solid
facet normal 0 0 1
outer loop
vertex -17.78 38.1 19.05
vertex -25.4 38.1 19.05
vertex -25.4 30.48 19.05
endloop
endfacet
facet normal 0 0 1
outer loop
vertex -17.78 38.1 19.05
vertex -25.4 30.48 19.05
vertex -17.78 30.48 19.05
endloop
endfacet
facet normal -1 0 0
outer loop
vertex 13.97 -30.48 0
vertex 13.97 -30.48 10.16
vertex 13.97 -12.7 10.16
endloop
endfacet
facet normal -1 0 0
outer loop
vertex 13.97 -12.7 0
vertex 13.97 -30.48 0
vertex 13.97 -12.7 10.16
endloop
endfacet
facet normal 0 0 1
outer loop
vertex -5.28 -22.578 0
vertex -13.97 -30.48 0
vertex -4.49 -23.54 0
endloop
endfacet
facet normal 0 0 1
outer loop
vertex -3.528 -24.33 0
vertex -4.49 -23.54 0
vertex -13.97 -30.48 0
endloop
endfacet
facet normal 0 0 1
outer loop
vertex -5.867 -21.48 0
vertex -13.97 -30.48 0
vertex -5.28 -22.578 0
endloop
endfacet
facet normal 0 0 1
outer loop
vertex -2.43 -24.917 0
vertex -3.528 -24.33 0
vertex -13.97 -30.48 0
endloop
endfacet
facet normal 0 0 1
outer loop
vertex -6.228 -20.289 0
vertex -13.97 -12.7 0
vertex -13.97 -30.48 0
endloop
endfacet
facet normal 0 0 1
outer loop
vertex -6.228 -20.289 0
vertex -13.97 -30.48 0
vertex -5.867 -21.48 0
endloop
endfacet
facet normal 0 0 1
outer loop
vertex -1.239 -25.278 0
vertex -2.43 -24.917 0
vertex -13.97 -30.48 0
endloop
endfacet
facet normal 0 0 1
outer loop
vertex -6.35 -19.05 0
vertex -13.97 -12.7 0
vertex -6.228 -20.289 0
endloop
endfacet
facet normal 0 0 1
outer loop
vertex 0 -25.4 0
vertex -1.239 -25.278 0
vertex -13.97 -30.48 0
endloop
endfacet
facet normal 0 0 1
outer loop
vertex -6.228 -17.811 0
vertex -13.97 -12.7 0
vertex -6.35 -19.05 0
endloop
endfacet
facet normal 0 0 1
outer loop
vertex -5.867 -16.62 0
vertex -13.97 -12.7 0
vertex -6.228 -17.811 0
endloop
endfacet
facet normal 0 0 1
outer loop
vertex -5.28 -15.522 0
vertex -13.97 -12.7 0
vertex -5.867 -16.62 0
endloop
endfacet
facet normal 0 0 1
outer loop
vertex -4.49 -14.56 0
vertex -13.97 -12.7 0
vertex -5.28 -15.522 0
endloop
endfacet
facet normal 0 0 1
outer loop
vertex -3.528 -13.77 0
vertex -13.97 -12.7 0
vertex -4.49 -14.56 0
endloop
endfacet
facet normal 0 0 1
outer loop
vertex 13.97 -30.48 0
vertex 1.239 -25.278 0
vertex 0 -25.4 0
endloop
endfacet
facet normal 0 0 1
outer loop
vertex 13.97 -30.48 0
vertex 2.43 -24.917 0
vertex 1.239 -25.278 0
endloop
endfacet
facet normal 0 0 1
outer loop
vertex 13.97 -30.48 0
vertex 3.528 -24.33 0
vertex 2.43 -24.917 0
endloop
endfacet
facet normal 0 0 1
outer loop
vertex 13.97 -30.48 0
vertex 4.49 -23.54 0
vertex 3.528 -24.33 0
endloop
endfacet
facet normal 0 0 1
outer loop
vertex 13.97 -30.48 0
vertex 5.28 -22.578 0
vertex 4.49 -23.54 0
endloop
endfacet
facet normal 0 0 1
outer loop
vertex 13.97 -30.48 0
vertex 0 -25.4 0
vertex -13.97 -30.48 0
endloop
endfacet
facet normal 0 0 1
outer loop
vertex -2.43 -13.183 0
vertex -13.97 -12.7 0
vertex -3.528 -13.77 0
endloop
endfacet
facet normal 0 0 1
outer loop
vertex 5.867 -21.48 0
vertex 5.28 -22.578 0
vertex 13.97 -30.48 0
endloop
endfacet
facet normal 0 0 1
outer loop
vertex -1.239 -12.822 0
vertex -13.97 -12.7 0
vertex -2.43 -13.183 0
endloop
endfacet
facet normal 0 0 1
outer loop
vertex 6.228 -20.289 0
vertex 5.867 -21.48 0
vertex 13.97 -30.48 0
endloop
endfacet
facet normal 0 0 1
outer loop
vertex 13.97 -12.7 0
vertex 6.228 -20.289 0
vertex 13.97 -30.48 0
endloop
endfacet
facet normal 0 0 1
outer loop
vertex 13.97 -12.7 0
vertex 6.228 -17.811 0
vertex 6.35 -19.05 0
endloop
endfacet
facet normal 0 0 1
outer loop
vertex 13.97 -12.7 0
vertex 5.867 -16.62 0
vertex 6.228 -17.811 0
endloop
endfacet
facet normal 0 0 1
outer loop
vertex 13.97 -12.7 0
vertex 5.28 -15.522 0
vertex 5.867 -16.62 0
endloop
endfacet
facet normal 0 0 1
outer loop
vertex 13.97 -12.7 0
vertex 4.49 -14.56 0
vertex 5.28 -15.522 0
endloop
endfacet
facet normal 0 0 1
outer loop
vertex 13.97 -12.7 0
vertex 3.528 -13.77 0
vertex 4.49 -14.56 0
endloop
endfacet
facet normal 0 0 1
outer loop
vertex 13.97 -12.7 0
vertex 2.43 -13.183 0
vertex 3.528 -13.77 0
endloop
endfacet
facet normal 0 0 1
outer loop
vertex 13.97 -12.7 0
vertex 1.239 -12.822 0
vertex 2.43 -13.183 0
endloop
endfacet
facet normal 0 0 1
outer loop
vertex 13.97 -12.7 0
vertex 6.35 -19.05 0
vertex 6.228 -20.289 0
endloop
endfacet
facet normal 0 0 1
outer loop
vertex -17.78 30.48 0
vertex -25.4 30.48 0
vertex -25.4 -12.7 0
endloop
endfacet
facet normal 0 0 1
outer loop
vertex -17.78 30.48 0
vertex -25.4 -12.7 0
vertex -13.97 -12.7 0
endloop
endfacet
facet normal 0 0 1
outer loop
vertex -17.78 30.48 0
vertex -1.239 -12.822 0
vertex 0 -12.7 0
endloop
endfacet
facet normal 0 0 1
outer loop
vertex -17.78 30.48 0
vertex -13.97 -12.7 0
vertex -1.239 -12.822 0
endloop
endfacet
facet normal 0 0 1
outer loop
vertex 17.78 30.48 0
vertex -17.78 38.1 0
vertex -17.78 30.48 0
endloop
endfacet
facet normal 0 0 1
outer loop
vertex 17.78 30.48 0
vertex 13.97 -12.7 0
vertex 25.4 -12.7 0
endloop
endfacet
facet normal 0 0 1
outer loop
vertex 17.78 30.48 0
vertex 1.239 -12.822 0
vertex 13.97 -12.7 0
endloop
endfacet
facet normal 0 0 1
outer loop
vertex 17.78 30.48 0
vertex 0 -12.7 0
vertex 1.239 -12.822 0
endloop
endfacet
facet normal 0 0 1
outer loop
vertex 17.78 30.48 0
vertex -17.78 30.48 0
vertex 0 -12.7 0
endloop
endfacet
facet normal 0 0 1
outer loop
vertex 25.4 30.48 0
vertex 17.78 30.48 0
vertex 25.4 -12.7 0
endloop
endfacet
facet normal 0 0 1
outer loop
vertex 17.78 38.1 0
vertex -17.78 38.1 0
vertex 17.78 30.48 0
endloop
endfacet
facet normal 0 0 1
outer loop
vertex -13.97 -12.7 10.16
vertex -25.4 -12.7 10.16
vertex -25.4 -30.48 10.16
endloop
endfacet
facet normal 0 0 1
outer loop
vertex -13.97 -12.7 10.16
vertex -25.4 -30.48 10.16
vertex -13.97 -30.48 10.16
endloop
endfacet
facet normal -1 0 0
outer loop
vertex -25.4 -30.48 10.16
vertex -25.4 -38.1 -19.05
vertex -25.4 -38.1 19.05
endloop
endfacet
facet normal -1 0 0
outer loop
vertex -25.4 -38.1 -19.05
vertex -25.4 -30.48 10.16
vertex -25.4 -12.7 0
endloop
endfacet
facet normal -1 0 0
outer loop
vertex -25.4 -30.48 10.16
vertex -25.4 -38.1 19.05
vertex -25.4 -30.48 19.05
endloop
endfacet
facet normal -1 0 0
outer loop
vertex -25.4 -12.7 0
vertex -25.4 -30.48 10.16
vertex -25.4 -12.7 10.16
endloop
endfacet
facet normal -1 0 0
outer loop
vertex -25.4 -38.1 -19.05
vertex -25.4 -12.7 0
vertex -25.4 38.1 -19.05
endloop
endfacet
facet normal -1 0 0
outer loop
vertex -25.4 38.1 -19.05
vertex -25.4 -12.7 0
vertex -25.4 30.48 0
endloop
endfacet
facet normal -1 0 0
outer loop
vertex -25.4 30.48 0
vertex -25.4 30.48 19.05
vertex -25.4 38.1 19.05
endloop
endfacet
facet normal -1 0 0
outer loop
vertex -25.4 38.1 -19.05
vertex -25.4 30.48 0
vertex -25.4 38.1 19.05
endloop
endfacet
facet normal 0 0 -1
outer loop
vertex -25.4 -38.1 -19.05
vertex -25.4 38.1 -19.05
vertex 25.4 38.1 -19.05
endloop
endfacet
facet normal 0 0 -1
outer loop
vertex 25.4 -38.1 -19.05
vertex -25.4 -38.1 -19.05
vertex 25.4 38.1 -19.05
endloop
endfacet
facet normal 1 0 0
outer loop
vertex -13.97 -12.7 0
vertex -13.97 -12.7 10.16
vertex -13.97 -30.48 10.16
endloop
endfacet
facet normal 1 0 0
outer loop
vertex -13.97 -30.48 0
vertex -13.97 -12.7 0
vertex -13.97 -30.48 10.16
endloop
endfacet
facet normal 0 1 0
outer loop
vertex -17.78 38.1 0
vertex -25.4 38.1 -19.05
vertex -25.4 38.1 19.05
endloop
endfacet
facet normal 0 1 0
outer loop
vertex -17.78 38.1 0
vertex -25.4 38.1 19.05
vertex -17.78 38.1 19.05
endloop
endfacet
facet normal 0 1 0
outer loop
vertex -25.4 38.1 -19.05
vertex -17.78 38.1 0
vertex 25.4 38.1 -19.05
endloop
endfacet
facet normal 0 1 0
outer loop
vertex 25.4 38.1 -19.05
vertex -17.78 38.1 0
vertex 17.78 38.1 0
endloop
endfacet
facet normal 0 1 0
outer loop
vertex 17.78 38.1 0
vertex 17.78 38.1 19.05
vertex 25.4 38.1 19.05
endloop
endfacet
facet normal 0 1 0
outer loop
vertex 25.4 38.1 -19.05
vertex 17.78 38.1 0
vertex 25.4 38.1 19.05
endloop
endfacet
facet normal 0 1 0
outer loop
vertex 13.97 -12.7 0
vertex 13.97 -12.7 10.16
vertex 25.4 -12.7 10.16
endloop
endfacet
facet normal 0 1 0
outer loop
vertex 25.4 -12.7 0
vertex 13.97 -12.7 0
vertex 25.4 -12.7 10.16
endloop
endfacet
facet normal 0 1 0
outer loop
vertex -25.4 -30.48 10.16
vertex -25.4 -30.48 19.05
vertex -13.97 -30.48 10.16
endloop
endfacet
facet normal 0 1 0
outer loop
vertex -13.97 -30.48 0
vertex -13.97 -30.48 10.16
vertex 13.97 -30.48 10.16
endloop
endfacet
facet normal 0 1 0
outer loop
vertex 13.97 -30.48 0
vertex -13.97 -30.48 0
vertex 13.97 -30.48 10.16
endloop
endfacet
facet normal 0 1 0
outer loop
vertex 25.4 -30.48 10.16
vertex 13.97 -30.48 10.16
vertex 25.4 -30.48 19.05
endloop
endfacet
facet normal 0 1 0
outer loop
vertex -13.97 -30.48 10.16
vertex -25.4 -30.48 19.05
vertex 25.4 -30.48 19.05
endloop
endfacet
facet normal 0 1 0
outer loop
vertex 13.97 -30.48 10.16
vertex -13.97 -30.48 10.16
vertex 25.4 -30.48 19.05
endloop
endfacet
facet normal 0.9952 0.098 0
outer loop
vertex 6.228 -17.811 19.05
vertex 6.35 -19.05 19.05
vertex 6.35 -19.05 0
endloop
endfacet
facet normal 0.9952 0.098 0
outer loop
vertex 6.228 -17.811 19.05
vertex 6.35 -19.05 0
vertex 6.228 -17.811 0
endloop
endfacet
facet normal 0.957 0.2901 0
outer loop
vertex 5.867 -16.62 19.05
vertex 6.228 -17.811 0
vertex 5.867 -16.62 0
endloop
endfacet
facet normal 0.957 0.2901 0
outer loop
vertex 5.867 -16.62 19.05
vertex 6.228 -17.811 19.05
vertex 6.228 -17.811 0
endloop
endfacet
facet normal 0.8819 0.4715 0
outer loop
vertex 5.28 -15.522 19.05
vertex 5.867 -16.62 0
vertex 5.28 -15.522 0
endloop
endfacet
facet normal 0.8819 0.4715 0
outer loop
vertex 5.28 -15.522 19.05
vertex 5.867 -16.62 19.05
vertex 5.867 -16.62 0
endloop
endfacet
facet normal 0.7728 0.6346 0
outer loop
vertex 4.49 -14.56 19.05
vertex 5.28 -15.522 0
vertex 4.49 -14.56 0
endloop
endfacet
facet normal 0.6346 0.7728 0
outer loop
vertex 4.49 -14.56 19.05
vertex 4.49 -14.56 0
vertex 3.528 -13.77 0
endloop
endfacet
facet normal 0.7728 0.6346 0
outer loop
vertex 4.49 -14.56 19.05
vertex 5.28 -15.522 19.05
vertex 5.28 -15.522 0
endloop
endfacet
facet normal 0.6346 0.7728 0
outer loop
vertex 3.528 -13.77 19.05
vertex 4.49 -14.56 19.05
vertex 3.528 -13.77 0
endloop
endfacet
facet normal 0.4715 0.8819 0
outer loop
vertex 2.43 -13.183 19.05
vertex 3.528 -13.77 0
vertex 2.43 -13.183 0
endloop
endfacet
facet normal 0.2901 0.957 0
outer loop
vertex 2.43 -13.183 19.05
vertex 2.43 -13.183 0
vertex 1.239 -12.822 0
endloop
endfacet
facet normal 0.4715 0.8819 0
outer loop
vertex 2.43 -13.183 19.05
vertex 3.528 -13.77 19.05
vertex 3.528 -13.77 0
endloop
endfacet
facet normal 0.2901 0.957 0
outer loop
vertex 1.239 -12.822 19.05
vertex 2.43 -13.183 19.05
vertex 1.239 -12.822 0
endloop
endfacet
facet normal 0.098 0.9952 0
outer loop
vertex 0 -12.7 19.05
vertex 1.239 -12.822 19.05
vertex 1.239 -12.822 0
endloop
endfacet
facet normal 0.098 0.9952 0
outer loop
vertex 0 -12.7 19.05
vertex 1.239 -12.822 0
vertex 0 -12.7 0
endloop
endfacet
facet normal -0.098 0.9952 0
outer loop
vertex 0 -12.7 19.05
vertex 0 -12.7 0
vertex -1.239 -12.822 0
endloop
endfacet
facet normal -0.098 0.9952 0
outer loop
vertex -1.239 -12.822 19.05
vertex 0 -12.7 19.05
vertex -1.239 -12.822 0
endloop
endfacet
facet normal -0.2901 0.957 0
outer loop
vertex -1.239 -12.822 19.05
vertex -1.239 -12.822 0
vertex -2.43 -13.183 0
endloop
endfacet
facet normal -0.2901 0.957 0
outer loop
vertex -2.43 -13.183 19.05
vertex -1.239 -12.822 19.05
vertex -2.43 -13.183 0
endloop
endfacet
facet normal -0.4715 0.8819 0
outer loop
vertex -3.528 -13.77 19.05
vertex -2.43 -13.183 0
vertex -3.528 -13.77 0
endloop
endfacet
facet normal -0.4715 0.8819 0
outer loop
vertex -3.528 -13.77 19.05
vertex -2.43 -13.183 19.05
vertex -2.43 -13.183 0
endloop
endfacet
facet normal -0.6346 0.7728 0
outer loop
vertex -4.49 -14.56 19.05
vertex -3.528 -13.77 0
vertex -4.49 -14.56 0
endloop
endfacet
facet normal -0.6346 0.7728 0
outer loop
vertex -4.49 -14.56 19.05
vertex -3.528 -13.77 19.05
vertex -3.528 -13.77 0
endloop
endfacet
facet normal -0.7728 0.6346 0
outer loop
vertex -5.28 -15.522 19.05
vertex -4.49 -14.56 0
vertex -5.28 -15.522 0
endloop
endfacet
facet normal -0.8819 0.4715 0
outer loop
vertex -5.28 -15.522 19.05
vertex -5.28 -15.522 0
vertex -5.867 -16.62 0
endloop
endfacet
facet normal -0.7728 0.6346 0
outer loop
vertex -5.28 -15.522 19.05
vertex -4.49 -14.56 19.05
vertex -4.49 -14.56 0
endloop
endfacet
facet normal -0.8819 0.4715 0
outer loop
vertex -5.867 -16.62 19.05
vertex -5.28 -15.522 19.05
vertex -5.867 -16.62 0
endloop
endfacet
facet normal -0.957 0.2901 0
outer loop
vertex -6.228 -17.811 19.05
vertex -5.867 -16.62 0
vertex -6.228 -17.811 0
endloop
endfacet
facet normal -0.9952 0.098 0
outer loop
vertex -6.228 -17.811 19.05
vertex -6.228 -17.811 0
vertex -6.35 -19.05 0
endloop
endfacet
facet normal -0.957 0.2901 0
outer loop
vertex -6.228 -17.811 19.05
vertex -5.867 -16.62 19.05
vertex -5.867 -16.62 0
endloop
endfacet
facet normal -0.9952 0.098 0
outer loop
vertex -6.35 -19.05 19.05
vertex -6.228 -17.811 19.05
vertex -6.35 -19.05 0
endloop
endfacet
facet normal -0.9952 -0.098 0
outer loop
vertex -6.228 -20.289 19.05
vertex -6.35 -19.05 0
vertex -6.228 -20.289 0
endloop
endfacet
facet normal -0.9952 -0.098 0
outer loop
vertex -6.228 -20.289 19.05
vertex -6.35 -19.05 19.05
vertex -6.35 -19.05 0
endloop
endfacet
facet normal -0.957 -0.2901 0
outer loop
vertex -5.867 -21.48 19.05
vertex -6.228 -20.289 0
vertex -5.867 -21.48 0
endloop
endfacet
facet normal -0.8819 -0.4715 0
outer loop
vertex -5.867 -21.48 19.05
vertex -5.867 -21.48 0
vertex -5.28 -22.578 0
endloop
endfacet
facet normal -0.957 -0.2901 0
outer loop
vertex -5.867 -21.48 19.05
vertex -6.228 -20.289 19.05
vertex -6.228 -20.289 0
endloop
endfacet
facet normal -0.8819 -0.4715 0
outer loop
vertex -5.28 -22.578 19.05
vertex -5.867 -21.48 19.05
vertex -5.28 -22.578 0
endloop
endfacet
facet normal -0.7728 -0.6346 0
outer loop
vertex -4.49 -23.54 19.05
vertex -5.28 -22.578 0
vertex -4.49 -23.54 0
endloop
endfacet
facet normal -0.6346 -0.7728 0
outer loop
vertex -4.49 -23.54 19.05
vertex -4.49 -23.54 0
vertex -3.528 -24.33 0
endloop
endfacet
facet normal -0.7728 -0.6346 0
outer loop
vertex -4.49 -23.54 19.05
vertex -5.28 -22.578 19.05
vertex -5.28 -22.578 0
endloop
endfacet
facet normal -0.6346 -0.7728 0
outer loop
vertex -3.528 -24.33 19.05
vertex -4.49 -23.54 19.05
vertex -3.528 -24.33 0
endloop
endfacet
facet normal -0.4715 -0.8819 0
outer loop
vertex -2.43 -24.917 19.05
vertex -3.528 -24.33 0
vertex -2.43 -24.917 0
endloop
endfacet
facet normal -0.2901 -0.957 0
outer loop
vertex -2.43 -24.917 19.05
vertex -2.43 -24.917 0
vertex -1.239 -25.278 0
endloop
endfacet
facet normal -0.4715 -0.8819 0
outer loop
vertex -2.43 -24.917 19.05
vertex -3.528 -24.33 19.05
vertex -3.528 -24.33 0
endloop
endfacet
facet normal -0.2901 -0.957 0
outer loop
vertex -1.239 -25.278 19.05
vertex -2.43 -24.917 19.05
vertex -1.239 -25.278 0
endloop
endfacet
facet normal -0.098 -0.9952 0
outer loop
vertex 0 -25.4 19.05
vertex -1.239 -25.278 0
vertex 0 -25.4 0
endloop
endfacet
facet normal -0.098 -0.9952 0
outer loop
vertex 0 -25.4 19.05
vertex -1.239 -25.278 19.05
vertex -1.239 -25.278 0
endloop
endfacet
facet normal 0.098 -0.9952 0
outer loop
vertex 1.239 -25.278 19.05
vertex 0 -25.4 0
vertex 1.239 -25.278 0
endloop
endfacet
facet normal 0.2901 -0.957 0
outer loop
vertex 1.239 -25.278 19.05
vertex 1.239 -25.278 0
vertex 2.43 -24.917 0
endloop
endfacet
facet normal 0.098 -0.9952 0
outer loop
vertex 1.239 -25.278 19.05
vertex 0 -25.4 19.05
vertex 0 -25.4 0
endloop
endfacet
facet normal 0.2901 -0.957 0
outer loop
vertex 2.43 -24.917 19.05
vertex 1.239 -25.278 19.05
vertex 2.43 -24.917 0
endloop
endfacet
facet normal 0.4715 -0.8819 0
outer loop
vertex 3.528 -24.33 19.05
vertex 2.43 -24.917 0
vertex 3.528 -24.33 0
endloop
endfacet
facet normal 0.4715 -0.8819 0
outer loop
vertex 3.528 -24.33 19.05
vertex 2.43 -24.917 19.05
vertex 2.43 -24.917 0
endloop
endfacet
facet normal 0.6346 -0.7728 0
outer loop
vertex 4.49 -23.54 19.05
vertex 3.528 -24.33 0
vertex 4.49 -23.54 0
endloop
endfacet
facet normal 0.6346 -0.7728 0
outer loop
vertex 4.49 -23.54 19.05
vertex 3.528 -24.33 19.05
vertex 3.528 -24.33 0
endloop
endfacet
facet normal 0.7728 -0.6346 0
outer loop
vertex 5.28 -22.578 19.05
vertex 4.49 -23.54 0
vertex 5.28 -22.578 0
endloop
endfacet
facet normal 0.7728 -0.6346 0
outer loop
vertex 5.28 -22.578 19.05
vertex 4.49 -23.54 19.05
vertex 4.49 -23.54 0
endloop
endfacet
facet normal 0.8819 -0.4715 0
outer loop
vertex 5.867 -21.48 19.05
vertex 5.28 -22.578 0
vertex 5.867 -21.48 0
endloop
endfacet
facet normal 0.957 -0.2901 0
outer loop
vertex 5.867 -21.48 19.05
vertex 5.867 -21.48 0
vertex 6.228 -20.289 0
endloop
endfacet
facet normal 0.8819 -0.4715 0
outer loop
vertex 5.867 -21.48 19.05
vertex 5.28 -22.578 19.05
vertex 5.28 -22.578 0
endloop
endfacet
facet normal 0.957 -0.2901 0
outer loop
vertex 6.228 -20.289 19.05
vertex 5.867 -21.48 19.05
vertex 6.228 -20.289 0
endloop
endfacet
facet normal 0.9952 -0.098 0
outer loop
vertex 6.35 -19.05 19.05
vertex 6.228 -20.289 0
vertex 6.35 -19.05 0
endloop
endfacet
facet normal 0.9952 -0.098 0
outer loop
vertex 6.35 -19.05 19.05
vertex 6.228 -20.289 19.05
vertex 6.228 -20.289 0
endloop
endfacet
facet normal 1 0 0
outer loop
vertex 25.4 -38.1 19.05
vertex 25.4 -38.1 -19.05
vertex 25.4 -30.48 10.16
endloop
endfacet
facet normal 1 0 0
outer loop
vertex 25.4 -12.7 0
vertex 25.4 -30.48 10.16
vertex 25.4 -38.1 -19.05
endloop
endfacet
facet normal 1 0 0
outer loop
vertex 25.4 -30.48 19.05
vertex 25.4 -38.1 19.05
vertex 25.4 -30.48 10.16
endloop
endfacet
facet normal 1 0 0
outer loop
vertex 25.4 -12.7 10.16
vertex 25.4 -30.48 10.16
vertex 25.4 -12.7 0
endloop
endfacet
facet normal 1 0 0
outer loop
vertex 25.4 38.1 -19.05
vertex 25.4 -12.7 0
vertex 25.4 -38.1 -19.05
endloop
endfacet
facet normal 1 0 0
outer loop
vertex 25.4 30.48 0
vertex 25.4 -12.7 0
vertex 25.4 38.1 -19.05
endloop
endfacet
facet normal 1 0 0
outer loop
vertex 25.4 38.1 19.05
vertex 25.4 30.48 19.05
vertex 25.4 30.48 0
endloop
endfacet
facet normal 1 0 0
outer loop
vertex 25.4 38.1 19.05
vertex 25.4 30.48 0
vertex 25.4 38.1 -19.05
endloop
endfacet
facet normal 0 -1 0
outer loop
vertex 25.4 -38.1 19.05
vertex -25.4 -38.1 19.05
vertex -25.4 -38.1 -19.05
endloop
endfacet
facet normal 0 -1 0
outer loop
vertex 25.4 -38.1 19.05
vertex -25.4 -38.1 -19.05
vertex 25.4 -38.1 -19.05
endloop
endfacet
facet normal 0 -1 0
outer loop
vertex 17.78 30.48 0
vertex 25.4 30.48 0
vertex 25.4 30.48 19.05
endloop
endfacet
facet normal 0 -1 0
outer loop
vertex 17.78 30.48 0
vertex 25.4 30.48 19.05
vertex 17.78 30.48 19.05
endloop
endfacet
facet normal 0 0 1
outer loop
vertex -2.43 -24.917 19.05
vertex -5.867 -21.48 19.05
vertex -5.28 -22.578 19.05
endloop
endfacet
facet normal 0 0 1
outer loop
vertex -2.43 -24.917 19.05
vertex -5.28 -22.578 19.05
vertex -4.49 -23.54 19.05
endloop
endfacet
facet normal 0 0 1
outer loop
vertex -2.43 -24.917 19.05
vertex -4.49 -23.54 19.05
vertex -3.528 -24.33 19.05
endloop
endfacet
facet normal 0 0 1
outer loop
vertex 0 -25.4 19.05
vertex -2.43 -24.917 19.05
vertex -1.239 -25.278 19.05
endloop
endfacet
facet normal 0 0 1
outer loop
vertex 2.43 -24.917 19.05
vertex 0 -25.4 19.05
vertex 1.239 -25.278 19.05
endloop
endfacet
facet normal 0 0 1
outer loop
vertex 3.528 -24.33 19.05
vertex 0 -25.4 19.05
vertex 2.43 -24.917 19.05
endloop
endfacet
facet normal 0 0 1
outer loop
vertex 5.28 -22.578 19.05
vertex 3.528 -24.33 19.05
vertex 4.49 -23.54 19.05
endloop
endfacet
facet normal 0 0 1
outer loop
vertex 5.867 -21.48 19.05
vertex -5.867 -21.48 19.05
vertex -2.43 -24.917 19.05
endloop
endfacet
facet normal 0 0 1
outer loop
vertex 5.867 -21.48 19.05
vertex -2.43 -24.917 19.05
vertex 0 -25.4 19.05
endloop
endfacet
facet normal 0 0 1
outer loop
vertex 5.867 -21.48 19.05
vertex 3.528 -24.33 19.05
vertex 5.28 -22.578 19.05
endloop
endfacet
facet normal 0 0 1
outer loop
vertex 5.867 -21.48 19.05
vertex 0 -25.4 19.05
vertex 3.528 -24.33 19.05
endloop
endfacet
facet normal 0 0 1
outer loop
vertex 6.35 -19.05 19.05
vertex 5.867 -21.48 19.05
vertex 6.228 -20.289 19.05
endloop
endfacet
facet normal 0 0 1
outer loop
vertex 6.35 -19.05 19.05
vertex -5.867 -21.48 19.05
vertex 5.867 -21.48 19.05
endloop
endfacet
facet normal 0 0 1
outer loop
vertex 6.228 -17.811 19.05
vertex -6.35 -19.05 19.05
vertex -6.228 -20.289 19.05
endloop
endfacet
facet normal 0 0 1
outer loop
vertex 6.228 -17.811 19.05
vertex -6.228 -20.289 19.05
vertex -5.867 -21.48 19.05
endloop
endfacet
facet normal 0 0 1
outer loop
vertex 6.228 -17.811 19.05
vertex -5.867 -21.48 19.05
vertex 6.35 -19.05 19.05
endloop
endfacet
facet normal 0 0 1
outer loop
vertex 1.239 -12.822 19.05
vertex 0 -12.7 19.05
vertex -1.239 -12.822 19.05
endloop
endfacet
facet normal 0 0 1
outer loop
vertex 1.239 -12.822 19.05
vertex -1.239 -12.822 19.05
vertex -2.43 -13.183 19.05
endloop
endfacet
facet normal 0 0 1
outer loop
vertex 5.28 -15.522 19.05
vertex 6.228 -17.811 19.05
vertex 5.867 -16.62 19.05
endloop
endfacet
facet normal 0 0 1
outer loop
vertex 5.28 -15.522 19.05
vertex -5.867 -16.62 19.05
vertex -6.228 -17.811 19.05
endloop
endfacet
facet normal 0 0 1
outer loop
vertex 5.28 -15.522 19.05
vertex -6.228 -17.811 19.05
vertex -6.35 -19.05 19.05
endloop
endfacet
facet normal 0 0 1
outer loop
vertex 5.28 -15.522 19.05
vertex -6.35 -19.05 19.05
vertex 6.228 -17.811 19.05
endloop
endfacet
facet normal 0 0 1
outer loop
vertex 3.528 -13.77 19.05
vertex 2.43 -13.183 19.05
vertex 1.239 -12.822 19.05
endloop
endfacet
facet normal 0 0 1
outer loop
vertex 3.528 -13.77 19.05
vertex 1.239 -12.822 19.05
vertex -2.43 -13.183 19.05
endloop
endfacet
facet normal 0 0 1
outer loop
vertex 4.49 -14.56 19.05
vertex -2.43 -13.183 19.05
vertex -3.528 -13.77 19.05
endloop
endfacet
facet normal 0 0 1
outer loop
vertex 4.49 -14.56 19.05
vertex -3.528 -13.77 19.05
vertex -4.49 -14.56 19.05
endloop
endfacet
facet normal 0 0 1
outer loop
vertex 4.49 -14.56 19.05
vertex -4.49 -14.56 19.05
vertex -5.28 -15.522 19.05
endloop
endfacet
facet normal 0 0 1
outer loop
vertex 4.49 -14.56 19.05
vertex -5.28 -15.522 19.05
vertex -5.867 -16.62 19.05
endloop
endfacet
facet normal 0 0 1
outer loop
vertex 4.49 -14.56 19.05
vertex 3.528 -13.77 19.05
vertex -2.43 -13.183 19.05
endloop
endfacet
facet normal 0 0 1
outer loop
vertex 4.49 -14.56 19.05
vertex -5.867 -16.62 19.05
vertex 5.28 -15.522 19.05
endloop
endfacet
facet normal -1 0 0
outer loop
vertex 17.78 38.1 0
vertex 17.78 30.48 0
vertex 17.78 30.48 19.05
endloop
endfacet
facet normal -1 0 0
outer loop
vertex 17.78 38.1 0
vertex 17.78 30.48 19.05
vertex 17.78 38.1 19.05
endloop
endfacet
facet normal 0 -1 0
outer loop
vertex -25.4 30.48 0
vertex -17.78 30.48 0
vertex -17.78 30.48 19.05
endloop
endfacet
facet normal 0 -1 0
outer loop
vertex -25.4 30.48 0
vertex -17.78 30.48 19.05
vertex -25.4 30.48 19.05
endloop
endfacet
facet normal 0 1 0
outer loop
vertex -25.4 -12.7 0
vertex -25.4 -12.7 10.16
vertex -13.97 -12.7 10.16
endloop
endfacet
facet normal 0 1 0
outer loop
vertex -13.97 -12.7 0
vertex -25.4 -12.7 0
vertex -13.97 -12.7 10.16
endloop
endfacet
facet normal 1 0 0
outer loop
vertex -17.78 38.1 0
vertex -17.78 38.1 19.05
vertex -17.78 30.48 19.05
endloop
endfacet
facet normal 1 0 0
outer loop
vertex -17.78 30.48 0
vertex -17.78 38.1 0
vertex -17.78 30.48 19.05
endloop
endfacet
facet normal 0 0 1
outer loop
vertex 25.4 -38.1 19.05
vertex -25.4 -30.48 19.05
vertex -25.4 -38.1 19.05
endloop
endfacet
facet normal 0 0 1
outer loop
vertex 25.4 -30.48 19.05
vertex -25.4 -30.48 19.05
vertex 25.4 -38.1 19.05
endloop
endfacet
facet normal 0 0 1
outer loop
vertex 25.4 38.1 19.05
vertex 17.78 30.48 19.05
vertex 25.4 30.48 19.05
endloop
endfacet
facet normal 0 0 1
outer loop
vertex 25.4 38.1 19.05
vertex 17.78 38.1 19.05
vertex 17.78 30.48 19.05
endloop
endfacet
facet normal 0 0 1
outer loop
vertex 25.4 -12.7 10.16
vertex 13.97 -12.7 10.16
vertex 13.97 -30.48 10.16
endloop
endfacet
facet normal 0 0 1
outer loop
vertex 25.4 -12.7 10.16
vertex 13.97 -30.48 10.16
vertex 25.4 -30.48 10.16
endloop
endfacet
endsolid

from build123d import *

# Parameters (mm, degrees)
F0_W     = 50.8
F0_H     = 76.2
F1_DEPTH = 19.05
F3_R     = 6.35
F4_DEPTH = 19.05
F2_W     = 11.43
F2_H     = 17.78
F5_DEPTH = 8.89


with BuildPart() as f1:
    # F0 (on Top) → F1 (new body, symmetric)
    with BuildSketch(Plane.XY):
        Rectangle(F0_W, F0_H)
    extrude(amount=F1_DEPTH, both=True)

    # F3 (on face) → F4 (cut)
    with BuildSketch(Plane.XY.offset(19.05)):
        Polygon((-17.78, 38.1), (-17.78, 30.48), (-25.4, 30.48), (-25.4, -12.7), (-13.97, -12.7), (-13.97, -30.48), (13.97, -30.48), (13.97, -12.7), (25.4, -12.7), (25.4, 30.48), (17.78, 30.48), (17.78, 38.1), align=None)
        with Locations((0, -19.05)):
            Circle(F3_R, mode=Mode.SUBTRACT)
    extrude(amount=-F4_DEPTH, mode=Mode.SUBTRACT)

    # F2 (on face) → F5 (cut)
    with BuildSketch(Plane.XY.offset(19.05)):
        with Locations((19.685, -21.59)):
            Rectangle(F2_W, F2_H)
        with Locations((-19.685, -21.59)):
            Rectangle(F2_W, F2_H)
    extrude(amount=-F5_DEPTH, mode=Mode.SUBTRACT)


solid = f1.part
